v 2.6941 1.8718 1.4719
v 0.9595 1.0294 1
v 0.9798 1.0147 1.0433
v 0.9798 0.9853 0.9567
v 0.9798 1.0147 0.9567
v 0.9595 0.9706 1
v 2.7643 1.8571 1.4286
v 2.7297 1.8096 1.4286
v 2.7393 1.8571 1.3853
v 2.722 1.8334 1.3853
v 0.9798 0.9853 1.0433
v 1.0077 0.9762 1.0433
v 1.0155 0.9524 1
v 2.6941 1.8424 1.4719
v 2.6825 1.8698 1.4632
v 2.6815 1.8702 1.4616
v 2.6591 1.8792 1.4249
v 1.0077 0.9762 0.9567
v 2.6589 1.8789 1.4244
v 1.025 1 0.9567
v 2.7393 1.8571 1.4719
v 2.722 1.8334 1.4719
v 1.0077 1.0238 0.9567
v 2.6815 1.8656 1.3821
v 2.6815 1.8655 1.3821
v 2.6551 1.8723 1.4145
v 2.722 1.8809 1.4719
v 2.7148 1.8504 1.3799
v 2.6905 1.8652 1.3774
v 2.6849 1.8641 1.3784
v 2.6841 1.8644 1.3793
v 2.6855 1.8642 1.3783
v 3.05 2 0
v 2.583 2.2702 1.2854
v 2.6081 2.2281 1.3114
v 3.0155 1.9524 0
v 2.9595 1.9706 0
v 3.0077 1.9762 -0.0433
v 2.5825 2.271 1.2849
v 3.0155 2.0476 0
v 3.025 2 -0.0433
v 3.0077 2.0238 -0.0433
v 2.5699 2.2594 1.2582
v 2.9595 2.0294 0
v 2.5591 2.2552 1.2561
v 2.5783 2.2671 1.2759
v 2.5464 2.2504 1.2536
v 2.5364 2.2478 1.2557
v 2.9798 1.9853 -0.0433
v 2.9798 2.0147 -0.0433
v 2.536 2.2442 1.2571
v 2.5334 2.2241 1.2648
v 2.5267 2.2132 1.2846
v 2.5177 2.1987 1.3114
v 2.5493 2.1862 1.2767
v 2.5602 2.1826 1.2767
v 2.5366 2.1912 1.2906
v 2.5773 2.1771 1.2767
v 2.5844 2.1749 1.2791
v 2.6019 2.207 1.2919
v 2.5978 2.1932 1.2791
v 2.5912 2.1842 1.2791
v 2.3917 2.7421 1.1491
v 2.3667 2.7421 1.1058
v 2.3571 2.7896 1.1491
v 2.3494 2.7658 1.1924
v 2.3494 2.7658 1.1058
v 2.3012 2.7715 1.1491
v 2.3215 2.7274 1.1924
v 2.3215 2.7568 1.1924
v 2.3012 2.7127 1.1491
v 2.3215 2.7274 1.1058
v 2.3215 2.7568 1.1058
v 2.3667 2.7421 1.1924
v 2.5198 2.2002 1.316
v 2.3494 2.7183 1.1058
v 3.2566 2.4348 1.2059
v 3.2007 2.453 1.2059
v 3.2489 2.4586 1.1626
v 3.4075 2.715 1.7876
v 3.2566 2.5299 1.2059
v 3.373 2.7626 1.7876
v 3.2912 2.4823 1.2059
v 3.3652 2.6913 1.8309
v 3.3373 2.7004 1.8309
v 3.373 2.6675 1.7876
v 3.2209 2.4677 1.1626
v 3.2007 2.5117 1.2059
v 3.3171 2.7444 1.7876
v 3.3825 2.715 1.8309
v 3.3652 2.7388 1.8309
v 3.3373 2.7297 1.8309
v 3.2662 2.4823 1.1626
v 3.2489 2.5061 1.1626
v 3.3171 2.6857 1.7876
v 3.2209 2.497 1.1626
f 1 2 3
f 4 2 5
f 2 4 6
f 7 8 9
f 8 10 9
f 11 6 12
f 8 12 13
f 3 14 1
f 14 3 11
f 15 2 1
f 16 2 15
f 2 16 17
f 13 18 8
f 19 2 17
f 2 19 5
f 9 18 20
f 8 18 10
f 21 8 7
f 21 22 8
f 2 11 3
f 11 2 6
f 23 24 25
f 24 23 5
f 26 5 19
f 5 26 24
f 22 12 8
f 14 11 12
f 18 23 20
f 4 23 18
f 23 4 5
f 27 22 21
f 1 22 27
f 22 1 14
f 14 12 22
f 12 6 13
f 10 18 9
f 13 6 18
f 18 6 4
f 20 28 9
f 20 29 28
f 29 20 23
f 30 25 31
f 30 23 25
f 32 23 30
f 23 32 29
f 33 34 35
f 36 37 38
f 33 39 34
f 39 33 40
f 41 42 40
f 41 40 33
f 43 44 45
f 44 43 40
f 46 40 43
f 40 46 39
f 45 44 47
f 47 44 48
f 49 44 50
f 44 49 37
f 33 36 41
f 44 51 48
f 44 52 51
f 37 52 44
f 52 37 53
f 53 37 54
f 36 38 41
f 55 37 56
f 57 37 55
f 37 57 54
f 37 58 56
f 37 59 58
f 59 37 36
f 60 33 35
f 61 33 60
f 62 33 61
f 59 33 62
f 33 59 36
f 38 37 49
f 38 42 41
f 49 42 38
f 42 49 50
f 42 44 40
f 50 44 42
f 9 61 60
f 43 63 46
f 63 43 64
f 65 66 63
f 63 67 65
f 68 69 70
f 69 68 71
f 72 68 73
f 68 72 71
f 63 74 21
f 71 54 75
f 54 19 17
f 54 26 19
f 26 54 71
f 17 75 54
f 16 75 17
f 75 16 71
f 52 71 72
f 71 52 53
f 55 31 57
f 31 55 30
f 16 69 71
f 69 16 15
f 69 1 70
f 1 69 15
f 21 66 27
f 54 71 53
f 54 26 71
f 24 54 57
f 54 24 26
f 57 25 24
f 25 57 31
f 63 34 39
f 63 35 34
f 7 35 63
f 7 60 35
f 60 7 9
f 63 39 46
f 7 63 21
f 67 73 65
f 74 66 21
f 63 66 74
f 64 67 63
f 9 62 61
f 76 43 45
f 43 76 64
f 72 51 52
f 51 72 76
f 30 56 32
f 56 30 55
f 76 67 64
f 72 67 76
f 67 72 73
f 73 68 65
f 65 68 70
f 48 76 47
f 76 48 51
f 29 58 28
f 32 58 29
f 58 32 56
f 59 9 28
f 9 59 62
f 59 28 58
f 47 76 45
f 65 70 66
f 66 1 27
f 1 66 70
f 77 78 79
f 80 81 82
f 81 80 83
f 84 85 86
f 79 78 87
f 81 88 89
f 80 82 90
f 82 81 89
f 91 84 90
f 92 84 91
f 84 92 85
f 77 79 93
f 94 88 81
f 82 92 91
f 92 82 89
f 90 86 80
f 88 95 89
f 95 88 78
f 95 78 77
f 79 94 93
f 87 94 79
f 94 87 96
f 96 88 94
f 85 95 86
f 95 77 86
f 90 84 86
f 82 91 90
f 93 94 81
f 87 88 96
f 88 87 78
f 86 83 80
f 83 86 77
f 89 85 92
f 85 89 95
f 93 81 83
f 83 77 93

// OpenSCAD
module line(a,b=[0,0,0], width=0.05){
    hull(){ translate(a) sphere(width); translate(b) sphere(width); }
}
function dot(a,b) = a*b;
function length(a) = norm(a);
function normalize(a) = a/norm(a);
function vec2(x,y)     = [x,y];
function vec3(x,y,z)   = [x,y,z];
function vec4(x,y,z,w) = [x,y,z,w];

A0=[1,1,1];
A1=[5,3,2];
A=normalize(A1-A0);
B0=[3,2,0];
B1=[4,4,5];
B=normalize(B1-B0);
r=0.5;

%line(A0, A1, r, $fn=30);
%line(B0, B1);

cn = normalize(cross(B,A));
projection_ =         dot(B0-A0, A) * A;
rejection   = B0-A0 - dot(B0-A0, A) * A - dot(B0-A0, cn) * cn;
sec_B_rejection  = dot(B,normalize(rejection));
closest_approach = B0-B*length(rejection)  / sec_B_rejection;
entrance         = B0-B*(length(rejection) - sqrt(max(r*r-pow(dot(B0-A0, cn), 2), 0)))/ sec_B_rejection;
exit             = B0-B*(length(rejection) + sqrt(max(r*r-pow(dot(B0-A0, cn), 2), 0)))/ sec_B_rejection;

color("red")   line(A0, A0+projection_);
color("green") line(B0, B0-rejection);
color("blue")  line(A0+projection_, A0+projection_+cn);
//color("yellow")line(B0, closest_approach);
color("green")line(entrance, exit);
